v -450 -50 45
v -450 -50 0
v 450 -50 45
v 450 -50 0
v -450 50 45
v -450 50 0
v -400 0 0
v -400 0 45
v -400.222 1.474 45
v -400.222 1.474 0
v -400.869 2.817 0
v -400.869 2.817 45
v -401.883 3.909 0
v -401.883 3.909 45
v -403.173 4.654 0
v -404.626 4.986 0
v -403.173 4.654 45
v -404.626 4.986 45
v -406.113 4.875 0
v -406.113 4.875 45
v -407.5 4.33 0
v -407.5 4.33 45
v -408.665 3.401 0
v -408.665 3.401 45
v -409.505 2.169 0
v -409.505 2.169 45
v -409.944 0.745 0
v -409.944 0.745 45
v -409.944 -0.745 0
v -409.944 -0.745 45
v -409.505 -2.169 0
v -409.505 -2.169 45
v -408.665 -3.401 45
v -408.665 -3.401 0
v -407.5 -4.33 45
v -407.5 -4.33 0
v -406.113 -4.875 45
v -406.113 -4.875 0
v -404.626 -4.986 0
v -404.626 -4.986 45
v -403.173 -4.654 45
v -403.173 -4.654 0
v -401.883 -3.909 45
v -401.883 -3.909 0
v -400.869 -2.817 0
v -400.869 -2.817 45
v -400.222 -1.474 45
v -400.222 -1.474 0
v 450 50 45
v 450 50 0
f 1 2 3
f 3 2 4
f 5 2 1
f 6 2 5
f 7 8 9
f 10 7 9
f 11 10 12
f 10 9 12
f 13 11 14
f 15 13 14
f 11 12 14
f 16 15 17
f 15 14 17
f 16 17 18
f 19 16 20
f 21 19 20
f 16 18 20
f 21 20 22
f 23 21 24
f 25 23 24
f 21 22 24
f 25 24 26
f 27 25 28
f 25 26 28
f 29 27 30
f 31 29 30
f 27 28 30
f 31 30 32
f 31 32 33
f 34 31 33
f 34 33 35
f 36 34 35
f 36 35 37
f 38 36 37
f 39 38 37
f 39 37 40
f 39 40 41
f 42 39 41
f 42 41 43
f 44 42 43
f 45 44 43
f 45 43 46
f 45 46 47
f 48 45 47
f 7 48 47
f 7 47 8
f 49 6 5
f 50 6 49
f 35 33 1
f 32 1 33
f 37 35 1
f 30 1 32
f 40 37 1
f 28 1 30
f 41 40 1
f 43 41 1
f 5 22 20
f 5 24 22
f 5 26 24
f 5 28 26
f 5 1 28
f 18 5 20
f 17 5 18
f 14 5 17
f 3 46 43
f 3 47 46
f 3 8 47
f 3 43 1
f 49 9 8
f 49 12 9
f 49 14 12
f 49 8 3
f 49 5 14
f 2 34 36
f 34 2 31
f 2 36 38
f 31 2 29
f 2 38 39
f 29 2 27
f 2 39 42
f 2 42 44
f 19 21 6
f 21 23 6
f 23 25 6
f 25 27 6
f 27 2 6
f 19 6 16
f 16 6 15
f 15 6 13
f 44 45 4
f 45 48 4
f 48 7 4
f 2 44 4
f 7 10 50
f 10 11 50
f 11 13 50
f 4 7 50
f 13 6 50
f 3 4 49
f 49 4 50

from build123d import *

# Parameters (mm, degrees)
F0_W     = 900
F0_H     = 100
F1_DEPTH = 45
F3_DEPTH = 130.1


with BuildPart() as f1:
    # F0 (on Top) → F1 (new body)
    with BuildSketch(Plane.XY):
        Rectangle(F0_W, F0_H)
    extrude(amount=F1_DEPTH)

    # F2 (on face) → F3 (cut)
    with BuildSketch(Plane.XY.offset(45)):
        with BuildLine():
            ThreePointArc((-410, 0), (-405, -5), (-400, 0))
            ThreePointArc((-400, 0), (-405, 5), (-410, 0))
        make_face()
    extrude(amount=-F3_DEPTH, mode=Mode.SUBTRACT)


solid = f1.part
